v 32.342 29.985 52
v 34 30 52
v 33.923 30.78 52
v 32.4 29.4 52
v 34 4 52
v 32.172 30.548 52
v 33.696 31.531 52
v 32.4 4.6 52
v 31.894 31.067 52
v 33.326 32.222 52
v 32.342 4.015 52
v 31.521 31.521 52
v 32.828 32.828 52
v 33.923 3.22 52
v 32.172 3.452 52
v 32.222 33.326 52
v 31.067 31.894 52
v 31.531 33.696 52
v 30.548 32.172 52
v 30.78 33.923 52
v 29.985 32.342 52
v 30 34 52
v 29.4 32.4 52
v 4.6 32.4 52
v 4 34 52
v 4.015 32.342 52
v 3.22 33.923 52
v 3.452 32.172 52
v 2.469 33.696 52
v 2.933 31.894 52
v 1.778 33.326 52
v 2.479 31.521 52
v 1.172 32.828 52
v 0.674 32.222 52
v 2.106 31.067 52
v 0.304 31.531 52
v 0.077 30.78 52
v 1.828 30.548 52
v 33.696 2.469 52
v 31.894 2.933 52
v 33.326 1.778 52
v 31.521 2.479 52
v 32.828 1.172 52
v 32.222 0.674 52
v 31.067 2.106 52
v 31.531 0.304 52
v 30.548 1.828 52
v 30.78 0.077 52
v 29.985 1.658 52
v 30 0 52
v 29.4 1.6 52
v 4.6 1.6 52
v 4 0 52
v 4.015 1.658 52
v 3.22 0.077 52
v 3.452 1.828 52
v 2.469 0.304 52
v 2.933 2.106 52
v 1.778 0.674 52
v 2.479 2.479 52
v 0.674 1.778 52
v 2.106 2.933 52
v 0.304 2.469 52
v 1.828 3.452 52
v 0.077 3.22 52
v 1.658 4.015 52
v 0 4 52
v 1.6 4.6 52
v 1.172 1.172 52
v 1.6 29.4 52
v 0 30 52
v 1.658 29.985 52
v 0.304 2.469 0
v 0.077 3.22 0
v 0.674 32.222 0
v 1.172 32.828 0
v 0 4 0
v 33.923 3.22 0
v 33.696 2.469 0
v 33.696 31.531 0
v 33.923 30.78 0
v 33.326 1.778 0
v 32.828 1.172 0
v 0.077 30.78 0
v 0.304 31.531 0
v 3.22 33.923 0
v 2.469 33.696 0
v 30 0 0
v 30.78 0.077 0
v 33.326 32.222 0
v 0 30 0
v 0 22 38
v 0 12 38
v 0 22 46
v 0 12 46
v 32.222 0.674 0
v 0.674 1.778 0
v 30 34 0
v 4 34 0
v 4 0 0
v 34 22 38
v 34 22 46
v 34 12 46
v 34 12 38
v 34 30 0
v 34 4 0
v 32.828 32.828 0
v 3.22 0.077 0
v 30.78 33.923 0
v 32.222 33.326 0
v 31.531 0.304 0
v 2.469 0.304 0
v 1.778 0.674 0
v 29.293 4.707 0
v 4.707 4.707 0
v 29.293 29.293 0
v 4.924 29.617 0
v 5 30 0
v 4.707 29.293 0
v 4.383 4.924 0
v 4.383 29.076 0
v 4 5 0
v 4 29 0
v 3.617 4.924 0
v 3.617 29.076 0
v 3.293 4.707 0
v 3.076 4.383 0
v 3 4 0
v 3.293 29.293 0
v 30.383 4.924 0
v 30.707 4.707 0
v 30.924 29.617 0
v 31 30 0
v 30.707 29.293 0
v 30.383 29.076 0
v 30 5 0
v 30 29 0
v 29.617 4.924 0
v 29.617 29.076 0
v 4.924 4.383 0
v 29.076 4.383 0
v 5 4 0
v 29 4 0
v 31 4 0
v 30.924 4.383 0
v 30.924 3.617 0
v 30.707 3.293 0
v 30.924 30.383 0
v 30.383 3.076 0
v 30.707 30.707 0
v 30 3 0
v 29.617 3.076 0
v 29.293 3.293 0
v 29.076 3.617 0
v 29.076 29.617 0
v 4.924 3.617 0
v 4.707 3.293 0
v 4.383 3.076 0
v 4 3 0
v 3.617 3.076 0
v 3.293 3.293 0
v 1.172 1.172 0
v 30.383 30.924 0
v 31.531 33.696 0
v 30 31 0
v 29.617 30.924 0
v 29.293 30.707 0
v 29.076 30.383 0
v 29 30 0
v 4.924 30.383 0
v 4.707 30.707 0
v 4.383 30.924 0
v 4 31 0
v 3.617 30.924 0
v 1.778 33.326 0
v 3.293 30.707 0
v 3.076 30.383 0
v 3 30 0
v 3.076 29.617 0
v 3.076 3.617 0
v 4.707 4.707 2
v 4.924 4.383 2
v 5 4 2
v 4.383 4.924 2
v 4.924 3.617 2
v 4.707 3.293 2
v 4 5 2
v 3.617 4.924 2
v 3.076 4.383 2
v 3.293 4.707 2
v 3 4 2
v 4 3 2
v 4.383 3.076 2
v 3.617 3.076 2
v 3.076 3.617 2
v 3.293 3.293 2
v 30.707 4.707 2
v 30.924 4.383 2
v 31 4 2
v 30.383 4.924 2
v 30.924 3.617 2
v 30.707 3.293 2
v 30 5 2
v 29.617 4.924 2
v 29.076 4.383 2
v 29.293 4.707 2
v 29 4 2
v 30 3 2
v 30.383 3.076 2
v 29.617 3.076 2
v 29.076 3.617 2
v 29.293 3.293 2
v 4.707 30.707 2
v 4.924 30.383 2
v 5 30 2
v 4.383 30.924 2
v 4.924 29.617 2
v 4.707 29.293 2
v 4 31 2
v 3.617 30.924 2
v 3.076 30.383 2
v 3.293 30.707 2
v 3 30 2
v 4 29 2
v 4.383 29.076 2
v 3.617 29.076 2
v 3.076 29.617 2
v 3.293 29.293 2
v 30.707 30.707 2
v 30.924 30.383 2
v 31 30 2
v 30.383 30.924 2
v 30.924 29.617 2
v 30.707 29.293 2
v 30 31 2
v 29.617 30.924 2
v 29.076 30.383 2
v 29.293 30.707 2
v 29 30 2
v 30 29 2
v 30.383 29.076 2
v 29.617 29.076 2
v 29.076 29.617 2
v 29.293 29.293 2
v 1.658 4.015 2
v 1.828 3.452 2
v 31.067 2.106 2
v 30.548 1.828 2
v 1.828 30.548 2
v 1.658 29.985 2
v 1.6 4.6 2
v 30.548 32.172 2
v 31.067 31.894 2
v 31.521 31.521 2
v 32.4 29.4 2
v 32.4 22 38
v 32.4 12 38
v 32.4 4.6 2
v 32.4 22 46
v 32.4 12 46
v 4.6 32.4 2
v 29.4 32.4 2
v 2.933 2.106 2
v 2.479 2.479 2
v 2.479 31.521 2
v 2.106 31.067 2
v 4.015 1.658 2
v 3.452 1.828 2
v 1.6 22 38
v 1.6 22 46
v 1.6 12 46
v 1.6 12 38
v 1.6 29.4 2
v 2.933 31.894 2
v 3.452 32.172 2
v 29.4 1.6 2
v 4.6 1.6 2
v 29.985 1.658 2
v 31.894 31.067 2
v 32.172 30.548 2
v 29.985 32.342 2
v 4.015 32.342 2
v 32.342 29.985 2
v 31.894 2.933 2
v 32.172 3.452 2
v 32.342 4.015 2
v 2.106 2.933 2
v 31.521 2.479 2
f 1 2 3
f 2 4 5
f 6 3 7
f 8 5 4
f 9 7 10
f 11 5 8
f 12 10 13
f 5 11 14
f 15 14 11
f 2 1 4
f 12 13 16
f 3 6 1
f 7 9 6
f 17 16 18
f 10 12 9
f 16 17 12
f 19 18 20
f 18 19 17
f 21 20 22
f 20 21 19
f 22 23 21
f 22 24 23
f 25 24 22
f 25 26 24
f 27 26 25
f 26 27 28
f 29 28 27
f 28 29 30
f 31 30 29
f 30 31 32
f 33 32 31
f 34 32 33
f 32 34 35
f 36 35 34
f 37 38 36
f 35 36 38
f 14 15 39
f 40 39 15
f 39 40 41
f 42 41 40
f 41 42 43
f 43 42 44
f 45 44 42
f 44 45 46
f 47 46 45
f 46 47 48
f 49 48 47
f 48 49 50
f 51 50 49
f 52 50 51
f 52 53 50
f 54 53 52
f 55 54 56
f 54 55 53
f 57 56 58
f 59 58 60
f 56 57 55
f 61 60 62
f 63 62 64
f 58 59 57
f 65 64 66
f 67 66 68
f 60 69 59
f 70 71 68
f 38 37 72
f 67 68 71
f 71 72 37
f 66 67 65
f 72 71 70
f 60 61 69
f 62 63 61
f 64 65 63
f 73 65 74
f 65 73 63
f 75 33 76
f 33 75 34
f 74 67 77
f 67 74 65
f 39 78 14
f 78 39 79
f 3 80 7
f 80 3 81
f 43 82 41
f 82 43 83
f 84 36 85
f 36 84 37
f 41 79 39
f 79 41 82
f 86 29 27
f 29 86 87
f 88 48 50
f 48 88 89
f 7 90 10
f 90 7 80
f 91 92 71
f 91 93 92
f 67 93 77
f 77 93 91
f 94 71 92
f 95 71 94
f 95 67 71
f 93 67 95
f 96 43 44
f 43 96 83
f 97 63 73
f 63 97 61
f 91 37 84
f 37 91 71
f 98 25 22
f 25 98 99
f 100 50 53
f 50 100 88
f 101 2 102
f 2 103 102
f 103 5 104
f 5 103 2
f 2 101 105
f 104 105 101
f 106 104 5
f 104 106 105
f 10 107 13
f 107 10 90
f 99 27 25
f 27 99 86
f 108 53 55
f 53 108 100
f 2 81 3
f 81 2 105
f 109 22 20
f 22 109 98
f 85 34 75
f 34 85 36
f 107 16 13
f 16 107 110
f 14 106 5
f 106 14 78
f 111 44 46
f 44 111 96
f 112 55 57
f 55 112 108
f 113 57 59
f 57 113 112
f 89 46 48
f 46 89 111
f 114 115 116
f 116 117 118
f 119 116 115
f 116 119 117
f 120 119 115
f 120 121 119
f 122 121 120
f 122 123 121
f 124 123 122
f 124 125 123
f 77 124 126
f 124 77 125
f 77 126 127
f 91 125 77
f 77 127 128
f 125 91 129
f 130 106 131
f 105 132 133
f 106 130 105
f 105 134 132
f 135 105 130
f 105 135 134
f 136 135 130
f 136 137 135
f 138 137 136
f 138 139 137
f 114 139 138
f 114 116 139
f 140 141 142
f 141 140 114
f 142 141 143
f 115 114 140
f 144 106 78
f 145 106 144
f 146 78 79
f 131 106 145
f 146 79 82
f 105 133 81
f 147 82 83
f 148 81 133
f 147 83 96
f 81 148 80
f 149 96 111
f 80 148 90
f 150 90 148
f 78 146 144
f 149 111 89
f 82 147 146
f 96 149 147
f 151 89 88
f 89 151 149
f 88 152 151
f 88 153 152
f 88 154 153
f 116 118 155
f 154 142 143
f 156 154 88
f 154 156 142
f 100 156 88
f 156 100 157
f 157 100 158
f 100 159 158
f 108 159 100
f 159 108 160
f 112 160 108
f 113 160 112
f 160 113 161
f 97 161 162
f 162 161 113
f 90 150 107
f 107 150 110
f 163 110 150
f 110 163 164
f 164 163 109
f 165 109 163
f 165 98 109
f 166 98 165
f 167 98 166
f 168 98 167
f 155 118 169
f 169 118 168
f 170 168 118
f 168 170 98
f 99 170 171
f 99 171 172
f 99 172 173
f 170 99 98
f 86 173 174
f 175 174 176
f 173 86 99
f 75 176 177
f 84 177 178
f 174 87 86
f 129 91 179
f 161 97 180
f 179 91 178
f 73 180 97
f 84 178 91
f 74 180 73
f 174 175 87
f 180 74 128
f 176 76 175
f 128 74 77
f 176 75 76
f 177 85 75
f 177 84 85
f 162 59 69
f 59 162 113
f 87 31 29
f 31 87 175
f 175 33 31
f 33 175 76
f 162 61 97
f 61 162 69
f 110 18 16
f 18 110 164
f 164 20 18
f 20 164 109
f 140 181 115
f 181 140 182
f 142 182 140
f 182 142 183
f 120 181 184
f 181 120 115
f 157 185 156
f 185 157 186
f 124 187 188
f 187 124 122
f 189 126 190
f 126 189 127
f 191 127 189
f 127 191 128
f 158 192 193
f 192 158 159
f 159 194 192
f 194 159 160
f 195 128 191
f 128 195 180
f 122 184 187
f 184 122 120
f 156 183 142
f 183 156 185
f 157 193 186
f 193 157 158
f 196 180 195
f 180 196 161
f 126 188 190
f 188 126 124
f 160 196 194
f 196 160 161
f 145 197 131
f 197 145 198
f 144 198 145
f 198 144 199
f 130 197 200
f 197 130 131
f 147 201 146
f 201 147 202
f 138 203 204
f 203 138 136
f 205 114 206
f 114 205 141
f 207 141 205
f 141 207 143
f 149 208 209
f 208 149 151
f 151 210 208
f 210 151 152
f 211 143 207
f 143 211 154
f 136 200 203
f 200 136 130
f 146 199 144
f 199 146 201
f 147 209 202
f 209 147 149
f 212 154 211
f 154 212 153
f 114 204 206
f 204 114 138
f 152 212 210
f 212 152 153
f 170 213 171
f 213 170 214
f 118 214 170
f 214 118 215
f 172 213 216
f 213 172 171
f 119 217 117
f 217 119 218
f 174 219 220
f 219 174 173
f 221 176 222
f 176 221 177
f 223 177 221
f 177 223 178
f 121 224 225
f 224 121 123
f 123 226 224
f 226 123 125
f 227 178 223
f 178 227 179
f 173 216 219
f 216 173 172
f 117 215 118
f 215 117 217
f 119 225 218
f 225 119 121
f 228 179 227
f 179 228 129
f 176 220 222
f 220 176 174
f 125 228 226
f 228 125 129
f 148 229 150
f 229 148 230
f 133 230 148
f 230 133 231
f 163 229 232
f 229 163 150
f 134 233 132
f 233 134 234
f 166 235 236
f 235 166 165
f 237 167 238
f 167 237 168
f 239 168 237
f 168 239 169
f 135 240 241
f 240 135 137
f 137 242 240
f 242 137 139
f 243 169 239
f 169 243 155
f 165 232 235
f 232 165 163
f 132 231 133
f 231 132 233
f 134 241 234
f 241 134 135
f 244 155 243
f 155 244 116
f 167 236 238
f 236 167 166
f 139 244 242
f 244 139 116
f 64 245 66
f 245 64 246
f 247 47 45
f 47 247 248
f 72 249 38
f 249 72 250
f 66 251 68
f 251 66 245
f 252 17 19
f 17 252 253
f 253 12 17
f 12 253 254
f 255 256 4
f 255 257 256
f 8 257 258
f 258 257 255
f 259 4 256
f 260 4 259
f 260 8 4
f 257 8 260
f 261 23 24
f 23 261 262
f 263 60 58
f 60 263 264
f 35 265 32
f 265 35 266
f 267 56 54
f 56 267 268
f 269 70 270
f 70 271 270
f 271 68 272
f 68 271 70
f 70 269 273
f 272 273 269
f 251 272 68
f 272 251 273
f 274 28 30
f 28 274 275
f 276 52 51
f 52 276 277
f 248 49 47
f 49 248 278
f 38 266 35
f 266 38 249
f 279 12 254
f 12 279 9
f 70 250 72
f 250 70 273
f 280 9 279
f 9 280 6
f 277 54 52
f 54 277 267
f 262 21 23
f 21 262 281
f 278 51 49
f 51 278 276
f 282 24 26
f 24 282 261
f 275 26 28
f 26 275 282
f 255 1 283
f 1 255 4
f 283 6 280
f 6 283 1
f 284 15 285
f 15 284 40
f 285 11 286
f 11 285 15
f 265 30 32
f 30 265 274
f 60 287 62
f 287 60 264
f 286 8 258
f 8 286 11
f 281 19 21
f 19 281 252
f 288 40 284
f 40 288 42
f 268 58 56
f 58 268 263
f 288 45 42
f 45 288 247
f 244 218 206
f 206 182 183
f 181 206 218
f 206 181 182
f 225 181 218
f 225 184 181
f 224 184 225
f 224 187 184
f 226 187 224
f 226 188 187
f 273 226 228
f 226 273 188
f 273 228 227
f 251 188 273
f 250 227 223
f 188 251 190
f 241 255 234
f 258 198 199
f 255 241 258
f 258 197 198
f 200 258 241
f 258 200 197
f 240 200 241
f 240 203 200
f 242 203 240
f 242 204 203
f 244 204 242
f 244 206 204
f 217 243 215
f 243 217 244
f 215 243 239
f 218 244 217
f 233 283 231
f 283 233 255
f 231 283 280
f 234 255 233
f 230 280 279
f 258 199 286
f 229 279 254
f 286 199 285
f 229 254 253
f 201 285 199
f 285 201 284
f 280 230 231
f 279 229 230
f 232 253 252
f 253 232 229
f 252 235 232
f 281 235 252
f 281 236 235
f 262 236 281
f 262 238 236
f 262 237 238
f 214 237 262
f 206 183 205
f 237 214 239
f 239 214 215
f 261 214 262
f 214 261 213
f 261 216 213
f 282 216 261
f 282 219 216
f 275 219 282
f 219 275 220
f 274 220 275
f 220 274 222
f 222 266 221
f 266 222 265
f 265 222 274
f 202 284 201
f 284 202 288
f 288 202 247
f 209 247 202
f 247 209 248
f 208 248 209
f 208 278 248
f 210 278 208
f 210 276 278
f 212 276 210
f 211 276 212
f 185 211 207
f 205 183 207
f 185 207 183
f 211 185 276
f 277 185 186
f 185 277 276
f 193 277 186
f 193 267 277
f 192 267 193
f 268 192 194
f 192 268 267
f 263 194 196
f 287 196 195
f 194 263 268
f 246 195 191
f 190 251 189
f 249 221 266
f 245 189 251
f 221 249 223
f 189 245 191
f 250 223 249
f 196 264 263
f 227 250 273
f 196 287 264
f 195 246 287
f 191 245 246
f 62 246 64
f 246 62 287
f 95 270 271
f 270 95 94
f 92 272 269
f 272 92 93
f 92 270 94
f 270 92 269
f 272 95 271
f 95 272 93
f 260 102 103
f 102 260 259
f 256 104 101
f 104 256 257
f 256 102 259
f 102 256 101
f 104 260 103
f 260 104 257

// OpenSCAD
// KegDisplay (Sallaup Electronics / Sallaup KegSense) - 3D printable case
// CONCEPT SKETCH, not a board-fitted enclosure yet. keg_display_module.kicad_pcb
// is currently 160x120mm - a generous first-pass ROUTING board, explicitly not
// size-optimized (see hardware/kegdisplay/README.md). This sketches the
// TARGET size/shape a size-optimized respin should aim for instead.
//
// Two explicit constraints driving this version (both from user feedback on
// the first sketch, which was tap-mounted with a small OLED window in a much
// bigger box):
//   1. NOT tap-mounted - no clip/bracket modeled here. Physical mounting is
//      still genuinely undecided (see README "Still open"); this version
//      just leaves the back plain rather than guessing again.
//   2. The OLED should cover most of the front face, not sit as a small
//      window in a big box.
//
// That second constraint is a real trade-off, not just a cosmetic tweak: the
// front footprint is sized to the OLED module (~28x28mm) rather than to the
// Arduino Nano (18x45mm on its headers), which is physically the bigger
// part. To still fit the Nano, it has to stand on edge BEHIND the display
// (its 45mm length running front-to-back, along the case's depth) instead of
// lying flat in the same plane as the OLED - which makes this case a deep,
// squarish "puck" (~34x34mm face, ~55mm deep) rather than a thin slab. A
// thinner case is possible, but only by letting the OLED go back to being a
// smaller fraction of a wider front face - flagging that trade explicitly
// rather than quietly picking one.

PART = "base"; // "base" | "lid" | "preview" (assembled, lid made transparent)

// ---- case shell (target size, not board-driven yet) --------------------
// Front footprint set by the OLED module, not the Nano - see header note.
outer_w = 34;
outer_h = 34;
wall = 1.6;
floor_t = 2.0;              // back plate
lid_t = 1.6;                // front plate (mostly cut away by the OLED window)
wall_ht = 50;                // cavity depth - Nano standing on edge (~45mm) + clearance

inner_w = outer_w - 2*wall;
inner_h = outer_h - 2*wall;

// ---- OLED window (front) ------------------------------------------------
// 0.96" SSD1306 active area is ~21.7x11.2mm, but the module's PCB (what the
// window needs to clear, not just the pixels) runs closer to 27.8x27.3mm on
// common breakouts - window sized just inside that, centered, so only a
// ~2mm bezel remains around it.
oled_w = 30;
oled_h = 30;
oled_x = (outer_w - oled_w) / 2;
oled_y = (outer_h - oled_h) / 2;

// ---- RJ12 daisy-chain cable cutouts ----------------------------------
// On the left/right side walls, near the BACK (away from the display face) -
// upstream in one side, downstream out the other.
rj12_cut_w = 10;   // along the wall's own face (Y)
rj12_cut_h = 8;    // height (Z)
rj12_cut_z = floor_t + wall_ht - 14;

// ---- corner lid-mounting posts ------------------------------------------
corner_post_d = 5;
corner_post_hole_d = 2;    // pilot hole, self-tapping M2
corner_inset = 4;
corner_posts = [
    [corner_inset, corner_inset],
    [outer_w - corner_inset, corner_inset],
    [corner_inset, outer_h - corner_inset],
    [outer_w - corner_inset, outer_h - corner_inset],
];

module rounded_rect(w, h, r) {
    hull() {
        for (dx = [r, w - r])
            for (dy = [r, h - r])
                translate([dx, dy]) circle(r = r, $fn = 32);
    }
}

module cavity() {
    translate([wall, wall, 0])
        linear_extrude(height = wall_ht + 1)
            rounded_rect(inner_w, inner_h, 3);
}

module base() {
    difference() {
        union() {
            linear_extrude(height = floor_t + wall_ht)
                rounded_rect(outer_w, outer_h, 4);
            // corner posts for lid screws
            for (p = corner_posts)
                translate([p[0], p[1], floor_t])
                    cylinder(d = corner_post_d, h = wall_ht, $fn = 24);
        }
        // hollow out the interior, leaving the floor
        translate([0, 0, floor_t]) cavity();
        // pilot holes down through the posts
        for (p = corner_posts)
            translate([p[0], p[1], -1])
                cylinder(d = corner_post_hole_d, h = floor_t + wall_ht + 2, $fn = 16);
        // RJ12 cable cutouts, left/right walls near the back
        translate([-0.5, (outer_h - rj12_cut_w) / 2, rj12_cut_z])
            cube([wall + 1, rj12_cut_w, rj12_cut_h]);
        translate([outer_w - wall - 0.5, (outer_h - rj12_cut_w) / 2, rj12_cut_z])
            cube([wall + 1, rj12_cut_w, rj12_cut_h]);
    }
}

module lid() {
    difference() {
        union() {
            linear_extrude(height = lid_t)
                rounded_rect(outer_w, outer_h, 4);
            // screw bosses matching the base's corner posts
            for (p = corner_posts)
                translate([p[0], p[1], lid_t])
                    cylinder(d = corner_post_d + 1, h = 2, $fn = 24);
        }
        // OLED viewing window
        translate([oled_x, oled_y, -1])
            linear_extrude(height = lid_t + 2)
                rounded_rect(oled_w, oled_h, 2);
        // screw clearance holes through the bosses
        for (p = corner_posts)
            translate([p[0], p[1], -1])
                cylinder(d = corner_post_hole_d + 0.6, h = lid_t + 4, $fn = 16);
    }
}

if (PART == "base") {
    base();
} else if (PART == "lid") {
    lid();
} else {
    // assembled preview - lid shown translucent, offset for visibility
    color("lightgray") base();
    translate([0, 0, floor_t + wall_ht + 0.2])
        color([0.2, 0.6, 0.9, 0.35]) lid();
}
